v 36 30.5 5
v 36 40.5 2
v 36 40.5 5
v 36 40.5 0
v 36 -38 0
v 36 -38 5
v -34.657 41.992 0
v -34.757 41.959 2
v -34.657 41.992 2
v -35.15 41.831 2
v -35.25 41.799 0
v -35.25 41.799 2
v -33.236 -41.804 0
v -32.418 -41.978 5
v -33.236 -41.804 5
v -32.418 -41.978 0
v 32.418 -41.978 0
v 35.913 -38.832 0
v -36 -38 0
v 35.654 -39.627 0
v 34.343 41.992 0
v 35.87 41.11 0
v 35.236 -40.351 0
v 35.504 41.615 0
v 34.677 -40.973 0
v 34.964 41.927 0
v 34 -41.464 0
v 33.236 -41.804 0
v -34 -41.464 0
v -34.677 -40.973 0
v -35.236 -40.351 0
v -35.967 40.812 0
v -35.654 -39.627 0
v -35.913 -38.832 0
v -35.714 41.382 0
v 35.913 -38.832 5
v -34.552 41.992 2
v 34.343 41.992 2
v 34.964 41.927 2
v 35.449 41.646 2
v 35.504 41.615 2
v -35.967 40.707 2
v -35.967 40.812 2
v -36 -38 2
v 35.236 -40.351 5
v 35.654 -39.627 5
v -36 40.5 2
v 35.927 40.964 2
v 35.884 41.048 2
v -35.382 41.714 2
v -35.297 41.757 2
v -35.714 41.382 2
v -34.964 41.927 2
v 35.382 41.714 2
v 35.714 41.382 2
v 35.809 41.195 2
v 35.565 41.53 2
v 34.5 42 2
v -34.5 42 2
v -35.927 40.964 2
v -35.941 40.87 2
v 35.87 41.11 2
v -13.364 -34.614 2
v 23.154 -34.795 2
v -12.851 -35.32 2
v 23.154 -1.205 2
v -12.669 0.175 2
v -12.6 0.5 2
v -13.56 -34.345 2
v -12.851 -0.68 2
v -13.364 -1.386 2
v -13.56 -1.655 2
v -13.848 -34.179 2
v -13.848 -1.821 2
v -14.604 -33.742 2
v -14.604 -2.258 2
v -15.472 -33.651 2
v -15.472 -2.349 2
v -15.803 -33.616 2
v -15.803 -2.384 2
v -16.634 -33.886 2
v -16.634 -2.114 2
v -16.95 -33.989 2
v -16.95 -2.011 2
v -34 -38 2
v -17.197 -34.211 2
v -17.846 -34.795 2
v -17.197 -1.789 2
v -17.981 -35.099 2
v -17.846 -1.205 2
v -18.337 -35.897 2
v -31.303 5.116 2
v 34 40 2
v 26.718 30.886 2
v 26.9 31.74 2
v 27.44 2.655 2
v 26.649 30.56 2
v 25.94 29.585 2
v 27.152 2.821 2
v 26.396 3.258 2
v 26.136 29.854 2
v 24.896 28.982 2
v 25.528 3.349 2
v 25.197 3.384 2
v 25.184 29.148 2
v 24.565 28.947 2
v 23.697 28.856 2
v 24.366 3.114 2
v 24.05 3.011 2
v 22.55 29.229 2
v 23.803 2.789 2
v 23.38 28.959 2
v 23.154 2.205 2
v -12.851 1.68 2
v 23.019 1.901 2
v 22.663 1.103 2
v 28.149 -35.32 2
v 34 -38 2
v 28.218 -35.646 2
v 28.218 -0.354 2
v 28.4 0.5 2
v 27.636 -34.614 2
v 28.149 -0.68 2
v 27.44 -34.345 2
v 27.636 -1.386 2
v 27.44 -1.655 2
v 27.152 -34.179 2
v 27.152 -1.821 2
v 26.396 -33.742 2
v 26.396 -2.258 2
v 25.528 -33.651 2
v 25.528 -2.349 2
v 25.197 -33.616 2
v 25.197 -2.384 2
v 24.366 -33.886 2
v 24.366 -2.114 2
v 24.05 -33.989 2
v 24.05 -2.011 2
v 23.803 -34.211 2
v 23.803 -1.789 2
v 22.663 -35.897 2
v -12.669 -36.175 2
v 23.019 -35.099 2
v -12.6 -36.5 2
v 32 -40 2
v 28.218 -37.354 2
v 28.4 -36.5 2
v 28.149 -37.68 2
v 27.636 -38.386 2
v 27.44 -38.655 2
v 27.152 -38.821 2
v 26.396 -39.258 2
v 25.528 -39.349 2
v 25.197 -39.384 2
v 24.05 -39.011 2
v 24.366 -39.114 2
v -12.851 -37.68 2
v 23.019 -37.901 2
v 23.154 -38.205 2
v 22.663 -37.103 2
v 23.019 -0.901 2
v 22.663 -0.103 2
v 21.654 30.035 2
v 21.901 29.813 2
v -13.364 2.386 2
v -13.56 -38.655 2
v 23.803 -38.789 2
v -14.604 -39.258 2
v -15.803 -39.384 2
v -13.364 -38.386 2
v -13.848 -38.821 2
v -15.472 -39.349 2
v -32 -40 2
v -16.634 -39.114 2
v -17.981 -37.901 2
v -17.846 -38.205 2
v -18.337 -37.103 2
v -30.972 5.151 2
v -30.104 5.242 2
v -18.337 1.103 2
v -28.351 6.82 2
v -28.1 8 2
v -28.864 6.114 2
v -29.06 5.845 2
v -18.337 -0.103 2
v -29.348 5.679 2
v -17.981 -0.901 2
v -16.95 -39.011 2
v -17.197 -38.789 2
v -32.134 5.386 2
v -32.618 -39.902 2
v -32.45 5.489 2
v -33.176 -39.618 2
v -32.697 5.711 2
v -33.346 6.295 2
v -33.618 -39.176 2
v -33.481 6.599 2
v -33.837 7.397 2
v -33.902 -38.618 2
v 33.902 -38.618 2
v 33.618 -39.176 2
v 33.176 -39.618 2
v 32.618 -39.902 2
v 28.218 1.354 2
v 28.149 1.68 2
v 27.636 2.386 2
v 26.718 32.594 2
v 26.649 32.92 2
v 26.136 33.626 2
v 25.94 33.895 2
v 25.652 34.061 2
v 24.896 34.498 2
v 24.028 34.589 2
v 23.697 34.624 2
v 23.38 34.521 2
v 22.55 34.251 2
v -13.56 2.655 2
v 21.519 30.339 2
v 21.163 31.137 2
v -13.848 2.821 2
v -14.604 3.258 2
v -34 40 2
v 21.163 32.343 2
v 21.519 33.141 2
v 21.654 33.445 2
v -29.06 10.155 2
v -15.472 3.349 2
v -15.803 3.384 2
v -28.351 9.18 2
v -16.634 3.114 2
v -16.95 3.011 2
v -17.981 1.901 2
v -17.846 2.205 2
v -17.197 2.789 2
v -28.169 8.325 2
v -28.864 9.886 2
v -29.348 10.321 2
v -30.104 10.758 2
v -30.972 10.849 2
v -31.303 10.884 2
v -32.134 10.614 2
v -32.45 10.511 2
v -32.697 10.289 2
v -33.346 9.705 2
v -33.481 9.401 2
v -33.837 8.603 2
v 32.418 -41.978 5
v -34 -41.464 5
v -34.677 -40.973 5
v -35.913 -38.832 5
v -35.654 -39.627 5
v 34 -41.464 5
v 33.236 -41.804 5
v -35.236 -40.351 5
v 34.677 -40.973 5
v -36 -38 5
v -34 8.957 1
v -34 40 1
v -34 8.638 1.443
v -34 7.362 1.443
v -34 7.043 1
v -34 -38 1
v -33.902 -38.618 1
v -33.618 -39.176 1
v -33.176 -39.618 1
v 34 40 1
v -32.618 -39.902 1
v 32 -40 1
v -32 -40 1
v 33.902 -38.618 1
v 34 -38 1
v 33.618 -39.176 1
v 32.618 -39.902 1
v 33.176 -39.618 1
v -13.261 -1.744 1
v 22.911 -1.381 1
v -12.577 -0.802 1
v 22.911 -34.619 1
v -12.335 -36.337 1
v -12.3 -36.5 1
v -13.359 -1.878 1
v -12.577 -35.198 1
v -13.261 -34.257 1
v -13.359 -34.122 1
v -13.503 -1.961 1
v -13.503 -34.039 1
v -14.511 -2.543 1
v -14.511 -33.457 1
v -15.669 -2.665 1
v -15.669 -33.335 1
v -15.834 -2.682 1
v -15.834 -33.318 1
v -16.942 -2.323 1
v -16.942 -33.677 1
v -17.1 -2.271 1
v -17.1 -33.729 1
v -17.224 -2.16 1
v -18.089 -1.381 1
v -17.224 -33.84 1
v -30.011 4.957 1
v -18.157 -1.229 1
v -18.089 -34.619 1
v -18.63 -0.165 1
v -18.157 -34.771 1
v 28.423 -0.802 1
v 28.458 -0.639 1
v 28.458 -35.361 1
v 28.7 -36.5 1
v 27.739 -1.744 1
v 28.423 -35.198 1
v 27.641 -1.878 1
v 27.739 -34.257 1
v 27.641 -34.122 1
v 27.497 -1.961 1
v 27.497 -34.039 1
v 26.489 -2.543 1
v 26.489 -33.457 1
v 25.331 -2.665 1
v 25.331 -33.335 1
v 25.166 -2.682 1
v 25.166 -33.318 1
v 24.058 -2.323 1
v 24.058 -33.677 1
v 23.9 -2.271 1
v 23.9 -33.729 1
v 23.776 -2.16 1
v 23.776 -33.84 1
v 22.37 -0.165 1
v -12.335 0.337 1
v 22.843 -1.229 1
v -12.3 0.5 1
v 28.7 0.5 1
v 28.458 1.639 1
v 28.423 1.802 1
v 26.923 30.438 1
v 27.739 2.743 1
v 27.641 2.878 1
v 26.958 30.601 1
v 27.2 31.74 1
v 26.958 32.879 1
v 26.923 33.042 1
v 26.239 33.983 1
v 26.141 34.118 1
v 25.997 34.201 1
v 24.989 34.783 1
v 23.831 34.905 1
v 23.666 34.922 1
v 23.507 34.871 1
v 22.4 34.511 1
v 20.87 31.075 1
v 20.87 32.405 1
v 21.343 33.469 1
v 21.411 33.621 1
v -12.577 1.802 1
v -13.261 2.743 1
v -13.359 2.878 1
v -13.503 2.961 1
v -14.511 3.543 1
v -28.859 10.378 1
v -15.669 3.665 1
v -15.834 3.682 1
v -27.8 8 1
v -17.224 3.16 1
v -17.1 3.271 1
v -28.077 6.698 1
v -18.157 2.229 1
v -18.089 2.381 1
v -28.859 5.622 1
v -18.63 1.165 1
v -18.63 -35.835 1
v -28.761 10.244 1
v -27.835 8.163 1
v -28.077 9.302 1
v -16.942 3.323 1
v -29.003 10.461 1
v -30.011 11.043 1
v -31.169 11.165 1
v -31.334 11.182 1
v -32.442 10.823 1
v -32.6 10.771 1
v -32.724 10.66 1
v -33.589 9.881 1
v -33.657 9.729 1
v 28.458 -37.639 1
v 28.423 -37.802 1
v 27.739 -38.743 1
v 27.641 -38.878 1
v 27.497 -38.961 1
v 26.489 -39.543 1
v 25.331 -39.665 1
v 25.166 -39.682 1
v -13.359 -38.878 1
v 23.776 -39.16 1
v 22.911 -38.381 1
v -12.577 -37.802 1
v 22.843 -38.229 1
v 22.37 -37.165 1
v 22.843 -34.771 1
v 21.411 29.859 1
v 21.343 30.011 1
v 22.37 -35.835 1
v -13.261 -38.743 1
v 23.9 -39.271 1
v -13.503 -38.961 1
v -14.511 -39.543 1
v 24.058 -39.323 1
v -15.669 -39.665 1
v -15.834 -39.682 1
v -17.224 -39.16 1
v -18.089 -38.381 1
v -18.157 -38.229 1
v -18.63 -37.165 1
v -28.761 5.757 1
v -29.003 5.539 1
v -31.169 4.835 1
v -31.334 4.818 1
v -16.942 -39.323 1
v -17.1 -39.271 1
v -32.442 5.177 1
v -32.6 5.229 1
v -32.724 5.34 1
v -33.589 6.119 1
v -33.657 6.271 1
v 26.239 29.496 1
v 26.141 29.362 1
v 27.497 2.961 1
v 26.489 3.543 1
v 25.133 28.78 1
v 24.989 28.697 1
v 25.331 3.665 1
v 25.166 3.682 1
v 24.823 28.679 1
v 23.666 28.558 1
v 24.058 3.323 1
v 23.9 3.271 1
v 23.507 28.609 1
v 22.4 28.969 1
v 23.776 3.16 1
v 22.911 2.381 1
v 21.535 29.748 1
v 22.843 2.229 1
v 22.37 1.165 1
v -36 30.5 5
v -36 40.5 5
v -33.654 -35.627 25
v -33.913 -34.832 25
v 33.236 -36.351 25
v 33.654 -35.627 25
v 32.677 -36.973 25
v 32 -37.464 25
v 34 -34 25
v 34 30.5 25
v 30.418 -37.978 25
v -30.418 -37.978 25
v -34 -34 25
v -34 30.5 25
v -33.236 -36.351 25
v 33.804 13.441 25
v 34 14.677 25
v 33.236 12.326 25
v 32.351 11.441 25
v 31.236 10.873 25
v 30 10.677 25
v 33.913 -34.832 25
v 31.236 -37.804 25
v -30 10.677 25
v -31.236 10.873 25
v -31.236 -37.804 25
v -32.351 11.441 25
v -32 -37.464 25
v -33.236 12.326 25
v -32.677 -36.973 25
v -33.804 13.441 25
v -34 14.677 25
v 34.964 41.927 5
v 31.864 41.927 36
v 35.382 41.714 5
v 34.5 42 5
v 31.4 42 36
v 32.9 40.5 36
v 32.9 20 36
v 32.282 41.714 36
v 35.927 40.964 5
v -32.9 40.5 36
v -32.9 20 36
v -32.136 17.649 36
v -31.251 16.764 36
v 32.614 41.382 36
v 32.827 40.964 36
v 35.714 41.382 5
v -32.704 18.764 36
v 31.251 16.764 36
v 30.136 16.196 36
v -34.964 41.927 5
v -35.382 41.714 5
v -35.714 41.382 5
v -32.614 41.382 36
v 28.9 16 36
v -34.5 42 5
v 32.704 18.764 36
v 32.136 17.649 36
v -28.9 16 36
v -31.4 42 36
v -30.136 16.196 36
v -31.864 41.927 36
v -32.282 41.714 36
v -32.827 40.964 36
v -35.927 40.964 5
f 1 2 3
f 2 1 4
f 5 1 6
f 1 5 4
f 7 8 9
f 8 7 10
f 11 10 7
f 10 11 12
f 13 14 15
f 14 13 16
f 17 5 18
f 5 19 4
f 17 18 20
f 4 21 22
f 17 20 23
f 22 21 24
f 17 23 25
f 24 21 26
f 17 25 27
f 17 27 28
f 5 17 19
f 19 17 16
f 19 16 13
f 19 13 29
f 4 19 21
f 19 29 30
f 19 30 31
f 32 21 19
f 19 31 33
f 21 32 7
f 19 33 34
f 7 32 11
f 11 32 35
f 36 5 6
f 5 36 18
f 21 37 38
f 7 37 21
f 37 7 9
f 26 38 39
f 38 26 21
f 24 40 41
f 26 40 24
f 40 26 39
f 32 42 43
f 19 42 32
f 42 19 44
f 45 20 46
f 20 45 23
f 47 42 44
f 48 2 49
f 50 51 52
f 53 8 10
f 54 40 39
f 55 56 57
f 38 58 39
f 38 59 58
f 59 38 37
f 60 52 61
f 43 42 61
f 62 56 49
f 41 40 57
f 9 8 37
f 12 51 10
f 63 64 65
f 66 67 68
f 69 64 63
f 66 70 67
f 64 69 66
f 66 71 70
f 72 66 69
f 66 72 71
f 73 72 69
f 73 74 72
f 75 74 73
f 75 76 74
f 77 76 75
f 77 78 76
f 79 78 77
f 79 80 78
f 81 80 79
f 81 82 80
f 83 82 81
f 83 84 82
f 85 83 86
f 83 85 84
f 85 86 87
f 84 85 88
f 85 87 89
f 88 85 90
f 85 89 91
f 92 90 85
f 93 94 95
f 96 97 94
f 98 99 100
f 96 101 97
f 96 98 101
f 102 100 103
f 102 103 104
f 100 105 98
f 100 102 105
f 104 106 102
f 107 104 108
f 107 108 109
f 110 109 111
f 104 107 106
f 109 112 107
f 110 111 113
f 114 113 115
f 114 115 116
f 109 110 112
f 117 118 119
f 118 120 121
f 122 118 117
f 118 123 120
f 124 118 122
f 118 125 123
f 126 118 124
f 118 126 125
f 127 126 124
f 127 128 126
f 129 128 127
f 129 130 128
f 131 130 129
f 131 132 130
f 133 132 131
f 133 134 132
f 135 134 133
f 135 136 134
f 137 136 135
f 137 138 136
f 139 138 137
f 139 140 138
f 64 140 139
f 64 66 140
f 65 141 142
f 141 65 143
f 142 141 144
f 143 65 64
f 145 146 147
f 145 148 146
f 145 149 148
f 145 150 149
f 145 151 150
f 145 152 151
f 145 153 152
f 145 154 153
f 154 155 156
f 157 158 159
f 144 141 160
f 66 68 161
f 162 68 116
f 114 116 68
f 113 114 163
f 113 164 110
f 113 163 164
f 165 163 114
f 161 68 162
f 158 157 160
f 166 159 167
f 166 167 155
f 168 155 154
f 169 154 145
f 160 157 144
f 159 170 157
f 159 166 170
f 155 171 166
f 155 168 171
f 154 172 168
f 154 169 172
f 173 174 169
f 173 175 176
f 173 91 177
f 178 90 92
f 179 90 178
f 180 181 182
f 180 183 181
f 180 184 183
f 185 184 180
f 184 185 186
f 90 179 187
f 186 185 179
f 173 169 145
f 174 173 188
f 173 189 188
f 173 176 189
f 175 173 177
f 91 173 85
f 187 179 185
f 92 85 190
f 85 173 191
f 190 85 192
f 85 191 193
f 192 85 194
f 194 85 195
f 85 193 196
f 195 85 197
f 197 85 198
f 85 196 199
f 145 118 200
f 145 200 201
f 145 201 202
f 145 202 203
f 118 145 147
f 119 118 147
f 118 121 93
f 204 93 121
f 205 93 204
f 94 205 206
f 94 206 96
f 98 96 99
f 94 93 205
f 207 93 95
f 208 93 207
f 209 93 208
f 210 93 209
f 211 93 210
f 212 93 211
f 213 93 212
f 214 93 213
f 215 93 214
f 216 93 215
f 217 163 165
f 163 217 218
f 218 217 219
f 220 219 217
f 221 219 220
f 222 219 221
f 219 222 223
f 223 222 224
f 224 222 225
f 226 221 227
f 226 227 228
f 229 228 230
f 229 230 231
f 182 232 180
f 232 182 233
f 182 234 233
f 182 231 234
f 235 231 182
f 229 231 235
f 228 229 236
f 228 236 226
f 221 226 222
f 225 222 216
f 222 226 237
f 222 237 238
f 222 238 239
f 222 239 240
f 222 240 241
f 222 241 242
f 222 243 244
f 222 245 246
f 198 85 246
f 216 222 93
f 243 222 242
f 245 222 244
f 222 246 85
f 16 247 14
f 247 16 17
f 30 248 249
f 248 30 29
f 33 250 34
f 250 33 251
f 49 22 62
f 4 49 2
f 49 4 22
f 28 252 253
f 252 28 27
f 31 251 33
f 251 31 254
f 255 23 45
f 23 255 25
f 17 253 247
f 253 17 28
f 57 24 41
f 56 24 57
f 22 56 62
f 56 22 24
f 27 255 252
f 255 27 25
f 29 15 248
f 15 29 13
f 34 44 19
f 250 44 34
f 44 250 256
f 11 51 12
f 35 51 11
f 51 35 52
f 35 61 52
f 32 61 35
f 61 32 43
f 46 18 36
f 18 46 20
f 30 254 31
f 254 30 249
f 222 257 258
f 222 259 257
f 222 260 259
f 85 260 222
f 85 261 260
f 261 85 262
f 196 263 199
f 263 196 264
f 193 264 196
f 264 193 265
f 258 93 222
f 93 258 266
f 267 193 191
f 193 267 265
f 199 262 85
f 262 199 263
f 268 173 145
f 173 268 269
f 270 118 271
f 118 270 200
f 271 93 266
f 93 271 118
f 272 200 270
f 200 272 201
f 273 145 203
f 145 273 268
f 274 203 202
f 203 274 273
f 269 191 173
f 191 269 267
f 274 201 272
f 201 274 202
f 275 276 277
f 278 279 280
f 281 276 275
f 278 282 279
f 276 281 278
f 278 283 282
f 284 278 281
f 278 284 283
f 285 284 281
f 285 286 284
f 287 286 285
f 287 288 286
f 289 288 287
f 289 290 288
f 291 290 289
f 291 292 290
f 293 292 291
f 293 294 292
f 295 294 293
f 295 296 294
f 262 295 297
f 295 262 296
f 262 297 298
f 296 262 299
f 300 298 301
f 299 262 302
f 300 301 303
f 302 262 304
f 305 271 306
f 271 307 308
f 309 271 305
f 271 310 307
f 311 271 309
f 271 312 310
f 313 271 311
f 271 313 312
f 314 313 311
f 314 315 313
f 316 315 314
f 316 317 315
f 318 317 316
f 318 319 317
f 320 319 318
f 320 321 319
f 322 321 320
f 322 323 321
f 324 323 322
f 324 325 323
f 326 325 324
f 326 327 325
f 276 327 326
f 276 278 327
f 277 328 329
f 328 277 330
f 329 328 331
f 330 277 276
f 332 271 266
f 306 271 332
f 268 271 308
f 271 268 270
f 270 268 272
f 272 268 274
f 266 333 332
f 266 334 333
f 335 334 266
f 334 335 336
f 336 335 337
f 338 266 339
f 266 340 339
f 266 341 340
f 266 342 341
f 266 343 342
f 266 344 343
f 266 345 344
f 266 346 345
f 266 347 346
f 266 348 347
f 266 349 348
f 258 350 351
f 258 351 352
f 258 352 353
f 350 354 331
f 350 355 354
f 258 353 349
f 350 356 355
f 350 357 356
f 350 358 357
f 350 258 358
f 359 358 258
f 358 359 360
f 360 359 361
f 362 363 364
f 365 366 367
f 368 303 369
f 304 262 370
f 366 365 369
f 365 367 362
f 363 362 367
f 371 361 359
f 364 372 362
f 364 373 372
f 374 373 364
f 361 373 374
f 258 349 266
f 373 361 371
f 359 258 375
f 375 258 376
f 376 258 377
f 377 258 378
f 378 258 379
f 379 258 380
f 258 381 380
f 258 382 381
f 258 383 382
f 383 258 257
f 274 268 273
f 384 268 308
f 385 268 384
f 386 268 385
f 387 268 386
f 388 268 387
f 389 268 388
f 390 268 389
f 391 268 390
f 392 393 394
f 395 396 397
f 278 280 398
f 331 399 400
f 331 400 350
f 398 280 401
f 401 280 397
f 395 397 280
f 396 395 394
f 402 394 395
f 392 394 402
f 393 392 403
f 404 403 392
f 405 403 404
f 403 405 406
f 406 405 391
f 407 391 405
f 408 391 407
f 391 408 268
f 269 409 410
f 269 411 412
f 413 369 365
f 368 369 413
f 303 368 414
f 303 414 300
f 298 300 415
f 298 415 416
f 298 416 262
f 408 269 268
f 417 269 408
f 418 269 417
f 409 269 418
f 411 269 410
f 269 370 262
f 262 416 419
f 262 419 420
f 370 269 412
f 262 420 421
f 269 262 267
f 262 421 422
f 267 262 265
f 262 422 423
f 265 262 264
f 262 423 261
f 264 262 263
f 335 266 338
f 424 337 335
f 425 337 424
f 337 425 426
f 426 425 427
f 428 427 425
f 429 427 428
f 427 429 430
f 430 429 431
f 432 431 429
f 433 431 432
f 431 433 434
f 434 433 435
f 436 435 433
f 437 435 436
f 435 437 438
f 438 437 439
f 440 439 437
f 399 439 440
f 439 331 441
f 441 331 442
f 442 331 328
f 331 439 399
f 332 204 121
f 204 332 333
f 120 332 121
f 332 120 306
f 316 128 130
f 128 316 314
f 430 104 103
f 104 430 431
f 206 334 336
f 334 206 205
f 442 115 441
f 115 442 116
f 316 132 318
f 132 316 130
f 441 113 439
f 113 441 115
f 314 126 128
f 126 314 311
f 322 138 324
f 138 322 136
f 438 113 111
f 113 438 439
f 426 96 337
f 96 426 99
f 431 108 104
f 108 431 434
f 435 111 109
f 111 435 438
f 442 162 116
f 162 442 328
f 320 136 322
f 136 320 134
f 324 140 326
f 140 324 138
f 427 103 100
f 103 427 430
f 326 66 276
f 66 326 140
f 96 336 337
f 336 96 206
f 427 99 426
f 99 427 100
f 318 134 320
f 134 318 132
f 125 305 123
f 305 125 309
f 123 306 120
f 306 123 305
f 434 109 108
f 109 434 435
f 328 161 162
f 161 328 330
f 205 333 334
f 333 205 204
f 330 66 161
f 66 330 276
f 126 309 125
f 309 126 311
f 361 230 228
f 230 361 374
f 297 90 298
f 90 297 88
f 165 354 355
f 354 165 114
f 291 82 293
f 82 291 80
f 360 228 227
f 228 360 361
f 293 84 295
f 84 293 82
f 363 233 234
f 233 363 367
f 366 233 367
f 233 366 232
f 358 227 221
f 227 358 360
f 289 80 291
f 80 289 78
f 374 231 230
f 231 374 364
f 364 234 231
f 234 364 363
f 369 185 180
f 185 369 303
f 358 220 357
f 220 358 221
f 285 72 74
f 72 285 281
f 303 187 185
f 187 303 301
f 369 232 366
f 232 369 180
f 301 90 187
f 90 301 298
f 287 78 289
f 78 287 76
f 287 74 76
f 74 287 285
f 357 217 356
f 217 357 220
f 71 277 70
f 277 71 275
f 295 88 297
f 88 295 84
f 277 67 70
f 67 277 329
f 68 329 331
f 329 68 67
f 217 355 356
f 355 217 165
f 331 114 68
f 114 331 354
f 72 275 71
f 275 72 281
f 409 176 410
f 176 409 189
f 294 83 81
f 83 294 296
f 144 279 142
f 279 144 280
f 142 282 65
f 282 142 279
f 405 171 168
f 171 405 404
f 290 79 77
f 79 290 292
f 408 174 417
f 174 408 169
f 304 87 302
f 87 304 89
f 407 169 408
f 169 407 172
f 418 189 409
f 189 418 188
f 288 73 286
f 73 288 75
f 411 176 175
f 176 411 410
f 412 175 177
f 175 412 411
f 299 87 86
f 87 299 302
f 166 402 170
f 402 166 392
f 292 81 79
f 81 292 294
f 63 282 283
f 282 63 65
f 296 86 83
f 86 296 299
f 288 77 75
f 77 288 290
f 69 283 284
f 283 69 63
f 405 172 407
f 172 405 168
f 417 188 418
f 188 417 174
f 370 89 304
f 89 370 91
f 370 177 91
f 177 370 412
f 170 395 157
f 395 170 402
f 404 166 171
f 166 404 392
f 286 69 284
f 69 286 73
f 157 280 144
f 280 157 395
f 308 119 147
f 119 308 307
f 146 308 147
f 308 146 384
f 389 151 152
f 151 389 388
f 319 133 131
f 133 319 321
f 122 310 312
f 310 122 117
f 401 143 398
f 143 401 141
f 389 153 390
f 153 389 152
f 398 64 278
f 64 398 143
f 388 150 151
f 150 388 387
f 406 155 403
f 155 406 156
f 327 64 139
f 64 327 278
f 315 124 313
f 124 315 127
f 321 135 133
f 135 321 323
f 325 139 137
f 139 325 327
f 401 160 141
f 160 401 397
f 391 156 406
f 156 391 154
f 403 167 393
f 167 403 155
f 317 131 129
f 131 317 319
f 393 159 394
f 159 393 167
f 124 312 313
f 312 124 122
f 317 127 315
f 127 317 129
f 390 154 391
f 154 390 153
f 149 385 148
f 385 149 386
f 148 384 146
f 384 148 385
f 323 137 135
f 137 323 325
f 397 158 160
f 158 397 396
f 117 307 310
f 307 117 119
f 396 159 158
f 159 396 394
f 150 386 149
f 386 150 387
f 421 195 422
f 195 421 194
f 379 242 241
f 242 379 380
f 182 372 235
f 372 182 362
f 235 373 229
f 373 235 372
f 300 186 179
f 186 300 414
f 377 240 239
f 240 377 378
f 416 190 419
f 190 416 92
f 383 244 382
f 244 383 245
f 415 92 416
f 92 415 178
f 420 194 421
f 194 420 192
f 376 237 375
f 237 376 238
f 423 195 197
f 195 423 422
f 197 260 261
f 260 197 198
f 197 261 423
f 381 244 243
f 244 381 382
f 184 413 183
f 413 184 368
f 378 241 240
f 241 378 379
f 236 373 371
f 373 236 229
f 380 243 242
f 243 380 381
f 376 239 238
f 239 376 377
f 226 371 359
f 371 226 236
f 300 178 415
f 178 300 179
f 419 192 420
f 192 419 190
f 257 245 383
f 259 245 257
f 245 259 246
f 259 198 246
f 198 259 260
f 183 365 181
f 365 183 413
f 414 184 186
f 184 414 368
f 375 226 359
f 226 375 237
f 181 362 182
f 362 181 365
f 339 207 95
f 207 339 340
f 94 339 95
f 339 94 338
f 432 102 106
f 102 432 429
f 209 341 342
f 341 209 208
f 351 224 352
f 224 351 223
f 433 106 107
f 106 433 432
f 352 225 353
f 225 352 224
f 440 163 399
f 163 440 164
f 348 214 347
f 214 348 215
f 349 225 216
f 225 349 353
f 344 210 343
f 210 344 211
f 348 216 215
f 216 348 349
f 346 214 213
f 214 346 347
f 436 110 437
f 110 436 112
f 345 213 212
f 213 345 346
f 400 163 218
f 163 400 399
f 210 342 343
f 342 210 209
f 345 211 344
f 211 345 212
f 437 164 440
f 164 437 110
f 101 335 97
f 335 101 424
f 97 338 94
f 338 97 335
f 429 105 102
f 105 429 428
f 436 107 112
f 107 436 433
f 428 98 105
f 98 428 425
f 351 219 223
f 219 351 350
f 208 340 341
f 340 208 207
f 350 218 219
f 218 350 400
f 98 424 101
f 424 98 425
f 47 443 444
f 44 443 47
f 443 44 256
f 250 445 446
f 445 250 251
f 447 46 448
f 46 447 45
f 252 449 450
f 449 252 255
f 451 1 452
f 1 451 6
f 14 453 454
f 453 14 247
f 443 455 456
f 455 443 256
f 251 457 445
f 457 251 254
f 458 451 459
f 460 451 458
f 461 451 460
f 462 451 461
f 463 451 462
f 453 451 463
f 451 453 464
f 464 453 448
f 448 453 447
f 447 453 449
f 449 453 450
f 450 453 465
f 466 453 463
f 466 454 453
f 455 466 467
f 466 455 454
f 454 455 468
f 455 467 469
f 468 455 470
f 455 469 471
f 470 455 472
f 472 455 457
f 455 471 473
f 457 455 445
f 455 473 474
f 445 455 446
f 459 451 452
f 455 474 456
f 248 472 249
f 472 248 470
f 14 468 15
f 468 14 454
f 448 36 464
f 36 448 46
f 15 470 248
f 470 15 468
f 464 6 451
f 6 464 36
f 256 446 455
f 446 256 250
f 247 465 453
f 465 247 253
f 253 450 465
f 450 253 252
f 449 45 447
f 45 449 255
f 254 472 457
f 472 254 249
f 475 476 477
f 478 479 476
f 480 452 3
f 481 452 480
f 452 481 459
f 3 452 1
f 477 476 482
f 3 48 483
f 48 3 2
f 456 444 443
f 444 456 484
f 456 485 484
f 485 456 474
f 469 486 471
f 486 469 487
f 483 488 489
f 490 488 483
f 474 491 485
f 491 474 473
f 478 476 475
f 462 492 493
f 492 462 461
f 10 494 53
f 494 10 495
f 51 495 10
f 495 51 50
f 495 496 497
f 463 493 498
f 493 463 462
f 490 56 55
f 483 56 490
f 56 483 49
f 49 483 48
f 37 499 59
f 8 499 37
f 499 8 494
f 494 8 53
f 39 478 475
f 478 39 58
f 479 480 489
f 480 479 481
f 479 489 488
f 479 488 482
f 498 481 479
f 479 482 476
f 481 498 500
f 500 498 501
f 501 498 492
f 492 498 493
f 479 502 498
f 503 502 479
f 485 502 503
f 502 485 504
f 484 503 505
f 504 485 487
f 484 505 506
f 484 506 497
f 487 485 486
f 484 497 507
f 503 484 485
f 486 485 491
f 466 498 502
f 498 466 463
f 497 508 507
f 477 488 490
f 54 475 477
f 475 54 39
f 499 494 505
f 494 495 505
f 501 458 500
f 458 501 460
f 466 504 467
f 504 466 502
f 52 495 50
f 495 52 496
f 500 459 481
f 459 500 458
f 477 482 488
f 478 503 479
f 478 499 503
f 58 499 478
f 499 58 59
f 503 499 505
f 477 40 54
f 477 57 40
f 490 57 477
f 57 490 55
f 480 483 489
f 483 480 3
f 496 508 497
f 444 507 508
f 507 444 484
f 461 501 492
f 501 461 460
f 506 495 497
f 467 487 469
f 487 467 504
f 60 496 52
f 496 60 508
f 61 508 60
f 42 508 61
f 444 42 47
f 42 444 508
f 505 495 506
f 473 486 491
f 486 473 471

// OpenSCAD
/*
translate([0,-18,5]){
    translate([5,0,0])color("green")CoolerControlPCB();
    translate([0,40,0])color("green")HWBuckPCB();
}
*/
bottom();
top();

module CoolerControlPCB(){
    translate([0,0,0.8])cube([45,41,1.6],true);
    translate([41/2,37/2,-6])cylinder(d=1.5,h=8,$fn=15);
    translate([-41/2,37/2,-6])cylinder(d=1.5,h=8,$fn=15);
    translate([-41/2,-37/2,-6])cylinder(d=1.5,h=8,$fn=15);
    translate([41/2,-37/2,-6])cylinder(d=1.5,h=8,$fn=15);
    translate([0,5,15/2+1.6])cube([26,31,15],true);
}

module HWBuckPCB(){
    translate([0,0,0.8])cube([66,32,1.6],true);
    translate([-31,-32/2+2,-6])cylinder(d=1.5,h=8,$fn=15);
    translate([66/2-9,32/2-6.26,-6])cylinder(d=1.5,h=8,$fn=15);
    cylinder(d=15,h=26+1.6,$fn=15);
}

module top(){
    hull(){
        translate([-72/2+4,-84/2+4,2])cylinder(d=8,h=3,$fn=30);
        translate([72/2-4,-84/2+4,2])cylinder(d=8,h=3,$fn=30);

        translate([-68/2+4,-76/2+4,22])cylinder(d=8,h=3,$fn=30);
        translate([68/2-4,-76/2+4,22])cylinder(d=8,h=3,$fn=30);

        translate([0,30,3/2+2])cube([72,1,3],true);
        translate([0,30,3/2+22])cube([68,1,3],true);
    }

    hull(){
        translate([-72/2+3/2,84/2-3/2,2])cylinder(d=3,h=3,$fn=20);
        translate([72/2-3/2,84/2-3/2,2])cylinder(d=3,h=3,$fn=20);

        translate([-65.8/2+3/2,84/2-3/2,33])cylinder(d=3,h=3,$fn=20);
        translate([65.8/2-3/2,84/2-3/2,33])cylinder(d=3,h=3,$fn=20);

        translate([-72/2+8/2,5,2])cylinder(d=8,h=3,$fn=20);
        translate([72/2-8/2,5,2])cylinder(d=8,h=3,$fn=20);

        translate([-65.8/2+8/2,20,33])cylinder(d=8,h=3,$fn=20);
        translate([65.8/2-8/2,20,33])cylinder(d=8,h=3,$fn=20);
    }
}

module bottom(){
    difference(){
    union(){
        hull(){
            translate([-72/2+4,-84/2+4,0])cylinder(d=8,h=2,$fn=30);
            translate([72/2-4,-84/2+4,0])cylinder(d=8,h=2,$fn=30);

            translate([-72/2+1.5,84/2-1.5,0])cylinder(d=3,h=2,$fn=15);
            translate([72/2-1.5,84/2-1.5,0])cylinder(d=3,h=2,$fn=15);
        }

        hull(){
            translate([-72/2+4,-84/2+4,0])cylinder(d=6,h=4,$fn=30);
            translate([72/2-4,-84/2+4,0])cylinder(d=6,h=4,$fn=30);

            translate([-72/2+1.5,84/2-1.5,0])cylinder(d=1,h=4,$fn=15);
            translate([72/2-1.5,84/2-1.5,0])cylinder(d=1,h=4,$fn=15);
        }
    }
        hull(){
            translate([0,10,4/2+1])cube([68,60,4], true);
            translate([-72/2+4,-84/2+4,1])cylinder(d=4,h=4,$fn=20);
            translate([72/2-4,-84/2+4,1])cylinder(d=4,h=4,$fn=20);
        }
    }

    translate([0,-18,6]){
        translate([5,0,0]){
        translate([41/2,37/2,-6])cylinder(d1=7,d2=4,h=5,$fn=15);
        translate([-41/2,37/2,-6])cylinder(d1=7,d2=4,h=5,$fn=15);
        translate([-41/2,-37/2,-6])cylinder(d1=7,d2=4,h=5,$fn=15);
        translate([41/2,-37/2,-6])cylinder(d1=7,d2=4,h=5,$fn=15);
    }
     translate([0,40,0]){
        translate([-31,-32/2+2,-6])cylinder(d1=7,d2=4,h=5,$fn=15);
        translate([66/2-9,32/2-6.26,-6])cylinder(d1=7,d2=4,h=5,$fn=15);
     }
    }
}
